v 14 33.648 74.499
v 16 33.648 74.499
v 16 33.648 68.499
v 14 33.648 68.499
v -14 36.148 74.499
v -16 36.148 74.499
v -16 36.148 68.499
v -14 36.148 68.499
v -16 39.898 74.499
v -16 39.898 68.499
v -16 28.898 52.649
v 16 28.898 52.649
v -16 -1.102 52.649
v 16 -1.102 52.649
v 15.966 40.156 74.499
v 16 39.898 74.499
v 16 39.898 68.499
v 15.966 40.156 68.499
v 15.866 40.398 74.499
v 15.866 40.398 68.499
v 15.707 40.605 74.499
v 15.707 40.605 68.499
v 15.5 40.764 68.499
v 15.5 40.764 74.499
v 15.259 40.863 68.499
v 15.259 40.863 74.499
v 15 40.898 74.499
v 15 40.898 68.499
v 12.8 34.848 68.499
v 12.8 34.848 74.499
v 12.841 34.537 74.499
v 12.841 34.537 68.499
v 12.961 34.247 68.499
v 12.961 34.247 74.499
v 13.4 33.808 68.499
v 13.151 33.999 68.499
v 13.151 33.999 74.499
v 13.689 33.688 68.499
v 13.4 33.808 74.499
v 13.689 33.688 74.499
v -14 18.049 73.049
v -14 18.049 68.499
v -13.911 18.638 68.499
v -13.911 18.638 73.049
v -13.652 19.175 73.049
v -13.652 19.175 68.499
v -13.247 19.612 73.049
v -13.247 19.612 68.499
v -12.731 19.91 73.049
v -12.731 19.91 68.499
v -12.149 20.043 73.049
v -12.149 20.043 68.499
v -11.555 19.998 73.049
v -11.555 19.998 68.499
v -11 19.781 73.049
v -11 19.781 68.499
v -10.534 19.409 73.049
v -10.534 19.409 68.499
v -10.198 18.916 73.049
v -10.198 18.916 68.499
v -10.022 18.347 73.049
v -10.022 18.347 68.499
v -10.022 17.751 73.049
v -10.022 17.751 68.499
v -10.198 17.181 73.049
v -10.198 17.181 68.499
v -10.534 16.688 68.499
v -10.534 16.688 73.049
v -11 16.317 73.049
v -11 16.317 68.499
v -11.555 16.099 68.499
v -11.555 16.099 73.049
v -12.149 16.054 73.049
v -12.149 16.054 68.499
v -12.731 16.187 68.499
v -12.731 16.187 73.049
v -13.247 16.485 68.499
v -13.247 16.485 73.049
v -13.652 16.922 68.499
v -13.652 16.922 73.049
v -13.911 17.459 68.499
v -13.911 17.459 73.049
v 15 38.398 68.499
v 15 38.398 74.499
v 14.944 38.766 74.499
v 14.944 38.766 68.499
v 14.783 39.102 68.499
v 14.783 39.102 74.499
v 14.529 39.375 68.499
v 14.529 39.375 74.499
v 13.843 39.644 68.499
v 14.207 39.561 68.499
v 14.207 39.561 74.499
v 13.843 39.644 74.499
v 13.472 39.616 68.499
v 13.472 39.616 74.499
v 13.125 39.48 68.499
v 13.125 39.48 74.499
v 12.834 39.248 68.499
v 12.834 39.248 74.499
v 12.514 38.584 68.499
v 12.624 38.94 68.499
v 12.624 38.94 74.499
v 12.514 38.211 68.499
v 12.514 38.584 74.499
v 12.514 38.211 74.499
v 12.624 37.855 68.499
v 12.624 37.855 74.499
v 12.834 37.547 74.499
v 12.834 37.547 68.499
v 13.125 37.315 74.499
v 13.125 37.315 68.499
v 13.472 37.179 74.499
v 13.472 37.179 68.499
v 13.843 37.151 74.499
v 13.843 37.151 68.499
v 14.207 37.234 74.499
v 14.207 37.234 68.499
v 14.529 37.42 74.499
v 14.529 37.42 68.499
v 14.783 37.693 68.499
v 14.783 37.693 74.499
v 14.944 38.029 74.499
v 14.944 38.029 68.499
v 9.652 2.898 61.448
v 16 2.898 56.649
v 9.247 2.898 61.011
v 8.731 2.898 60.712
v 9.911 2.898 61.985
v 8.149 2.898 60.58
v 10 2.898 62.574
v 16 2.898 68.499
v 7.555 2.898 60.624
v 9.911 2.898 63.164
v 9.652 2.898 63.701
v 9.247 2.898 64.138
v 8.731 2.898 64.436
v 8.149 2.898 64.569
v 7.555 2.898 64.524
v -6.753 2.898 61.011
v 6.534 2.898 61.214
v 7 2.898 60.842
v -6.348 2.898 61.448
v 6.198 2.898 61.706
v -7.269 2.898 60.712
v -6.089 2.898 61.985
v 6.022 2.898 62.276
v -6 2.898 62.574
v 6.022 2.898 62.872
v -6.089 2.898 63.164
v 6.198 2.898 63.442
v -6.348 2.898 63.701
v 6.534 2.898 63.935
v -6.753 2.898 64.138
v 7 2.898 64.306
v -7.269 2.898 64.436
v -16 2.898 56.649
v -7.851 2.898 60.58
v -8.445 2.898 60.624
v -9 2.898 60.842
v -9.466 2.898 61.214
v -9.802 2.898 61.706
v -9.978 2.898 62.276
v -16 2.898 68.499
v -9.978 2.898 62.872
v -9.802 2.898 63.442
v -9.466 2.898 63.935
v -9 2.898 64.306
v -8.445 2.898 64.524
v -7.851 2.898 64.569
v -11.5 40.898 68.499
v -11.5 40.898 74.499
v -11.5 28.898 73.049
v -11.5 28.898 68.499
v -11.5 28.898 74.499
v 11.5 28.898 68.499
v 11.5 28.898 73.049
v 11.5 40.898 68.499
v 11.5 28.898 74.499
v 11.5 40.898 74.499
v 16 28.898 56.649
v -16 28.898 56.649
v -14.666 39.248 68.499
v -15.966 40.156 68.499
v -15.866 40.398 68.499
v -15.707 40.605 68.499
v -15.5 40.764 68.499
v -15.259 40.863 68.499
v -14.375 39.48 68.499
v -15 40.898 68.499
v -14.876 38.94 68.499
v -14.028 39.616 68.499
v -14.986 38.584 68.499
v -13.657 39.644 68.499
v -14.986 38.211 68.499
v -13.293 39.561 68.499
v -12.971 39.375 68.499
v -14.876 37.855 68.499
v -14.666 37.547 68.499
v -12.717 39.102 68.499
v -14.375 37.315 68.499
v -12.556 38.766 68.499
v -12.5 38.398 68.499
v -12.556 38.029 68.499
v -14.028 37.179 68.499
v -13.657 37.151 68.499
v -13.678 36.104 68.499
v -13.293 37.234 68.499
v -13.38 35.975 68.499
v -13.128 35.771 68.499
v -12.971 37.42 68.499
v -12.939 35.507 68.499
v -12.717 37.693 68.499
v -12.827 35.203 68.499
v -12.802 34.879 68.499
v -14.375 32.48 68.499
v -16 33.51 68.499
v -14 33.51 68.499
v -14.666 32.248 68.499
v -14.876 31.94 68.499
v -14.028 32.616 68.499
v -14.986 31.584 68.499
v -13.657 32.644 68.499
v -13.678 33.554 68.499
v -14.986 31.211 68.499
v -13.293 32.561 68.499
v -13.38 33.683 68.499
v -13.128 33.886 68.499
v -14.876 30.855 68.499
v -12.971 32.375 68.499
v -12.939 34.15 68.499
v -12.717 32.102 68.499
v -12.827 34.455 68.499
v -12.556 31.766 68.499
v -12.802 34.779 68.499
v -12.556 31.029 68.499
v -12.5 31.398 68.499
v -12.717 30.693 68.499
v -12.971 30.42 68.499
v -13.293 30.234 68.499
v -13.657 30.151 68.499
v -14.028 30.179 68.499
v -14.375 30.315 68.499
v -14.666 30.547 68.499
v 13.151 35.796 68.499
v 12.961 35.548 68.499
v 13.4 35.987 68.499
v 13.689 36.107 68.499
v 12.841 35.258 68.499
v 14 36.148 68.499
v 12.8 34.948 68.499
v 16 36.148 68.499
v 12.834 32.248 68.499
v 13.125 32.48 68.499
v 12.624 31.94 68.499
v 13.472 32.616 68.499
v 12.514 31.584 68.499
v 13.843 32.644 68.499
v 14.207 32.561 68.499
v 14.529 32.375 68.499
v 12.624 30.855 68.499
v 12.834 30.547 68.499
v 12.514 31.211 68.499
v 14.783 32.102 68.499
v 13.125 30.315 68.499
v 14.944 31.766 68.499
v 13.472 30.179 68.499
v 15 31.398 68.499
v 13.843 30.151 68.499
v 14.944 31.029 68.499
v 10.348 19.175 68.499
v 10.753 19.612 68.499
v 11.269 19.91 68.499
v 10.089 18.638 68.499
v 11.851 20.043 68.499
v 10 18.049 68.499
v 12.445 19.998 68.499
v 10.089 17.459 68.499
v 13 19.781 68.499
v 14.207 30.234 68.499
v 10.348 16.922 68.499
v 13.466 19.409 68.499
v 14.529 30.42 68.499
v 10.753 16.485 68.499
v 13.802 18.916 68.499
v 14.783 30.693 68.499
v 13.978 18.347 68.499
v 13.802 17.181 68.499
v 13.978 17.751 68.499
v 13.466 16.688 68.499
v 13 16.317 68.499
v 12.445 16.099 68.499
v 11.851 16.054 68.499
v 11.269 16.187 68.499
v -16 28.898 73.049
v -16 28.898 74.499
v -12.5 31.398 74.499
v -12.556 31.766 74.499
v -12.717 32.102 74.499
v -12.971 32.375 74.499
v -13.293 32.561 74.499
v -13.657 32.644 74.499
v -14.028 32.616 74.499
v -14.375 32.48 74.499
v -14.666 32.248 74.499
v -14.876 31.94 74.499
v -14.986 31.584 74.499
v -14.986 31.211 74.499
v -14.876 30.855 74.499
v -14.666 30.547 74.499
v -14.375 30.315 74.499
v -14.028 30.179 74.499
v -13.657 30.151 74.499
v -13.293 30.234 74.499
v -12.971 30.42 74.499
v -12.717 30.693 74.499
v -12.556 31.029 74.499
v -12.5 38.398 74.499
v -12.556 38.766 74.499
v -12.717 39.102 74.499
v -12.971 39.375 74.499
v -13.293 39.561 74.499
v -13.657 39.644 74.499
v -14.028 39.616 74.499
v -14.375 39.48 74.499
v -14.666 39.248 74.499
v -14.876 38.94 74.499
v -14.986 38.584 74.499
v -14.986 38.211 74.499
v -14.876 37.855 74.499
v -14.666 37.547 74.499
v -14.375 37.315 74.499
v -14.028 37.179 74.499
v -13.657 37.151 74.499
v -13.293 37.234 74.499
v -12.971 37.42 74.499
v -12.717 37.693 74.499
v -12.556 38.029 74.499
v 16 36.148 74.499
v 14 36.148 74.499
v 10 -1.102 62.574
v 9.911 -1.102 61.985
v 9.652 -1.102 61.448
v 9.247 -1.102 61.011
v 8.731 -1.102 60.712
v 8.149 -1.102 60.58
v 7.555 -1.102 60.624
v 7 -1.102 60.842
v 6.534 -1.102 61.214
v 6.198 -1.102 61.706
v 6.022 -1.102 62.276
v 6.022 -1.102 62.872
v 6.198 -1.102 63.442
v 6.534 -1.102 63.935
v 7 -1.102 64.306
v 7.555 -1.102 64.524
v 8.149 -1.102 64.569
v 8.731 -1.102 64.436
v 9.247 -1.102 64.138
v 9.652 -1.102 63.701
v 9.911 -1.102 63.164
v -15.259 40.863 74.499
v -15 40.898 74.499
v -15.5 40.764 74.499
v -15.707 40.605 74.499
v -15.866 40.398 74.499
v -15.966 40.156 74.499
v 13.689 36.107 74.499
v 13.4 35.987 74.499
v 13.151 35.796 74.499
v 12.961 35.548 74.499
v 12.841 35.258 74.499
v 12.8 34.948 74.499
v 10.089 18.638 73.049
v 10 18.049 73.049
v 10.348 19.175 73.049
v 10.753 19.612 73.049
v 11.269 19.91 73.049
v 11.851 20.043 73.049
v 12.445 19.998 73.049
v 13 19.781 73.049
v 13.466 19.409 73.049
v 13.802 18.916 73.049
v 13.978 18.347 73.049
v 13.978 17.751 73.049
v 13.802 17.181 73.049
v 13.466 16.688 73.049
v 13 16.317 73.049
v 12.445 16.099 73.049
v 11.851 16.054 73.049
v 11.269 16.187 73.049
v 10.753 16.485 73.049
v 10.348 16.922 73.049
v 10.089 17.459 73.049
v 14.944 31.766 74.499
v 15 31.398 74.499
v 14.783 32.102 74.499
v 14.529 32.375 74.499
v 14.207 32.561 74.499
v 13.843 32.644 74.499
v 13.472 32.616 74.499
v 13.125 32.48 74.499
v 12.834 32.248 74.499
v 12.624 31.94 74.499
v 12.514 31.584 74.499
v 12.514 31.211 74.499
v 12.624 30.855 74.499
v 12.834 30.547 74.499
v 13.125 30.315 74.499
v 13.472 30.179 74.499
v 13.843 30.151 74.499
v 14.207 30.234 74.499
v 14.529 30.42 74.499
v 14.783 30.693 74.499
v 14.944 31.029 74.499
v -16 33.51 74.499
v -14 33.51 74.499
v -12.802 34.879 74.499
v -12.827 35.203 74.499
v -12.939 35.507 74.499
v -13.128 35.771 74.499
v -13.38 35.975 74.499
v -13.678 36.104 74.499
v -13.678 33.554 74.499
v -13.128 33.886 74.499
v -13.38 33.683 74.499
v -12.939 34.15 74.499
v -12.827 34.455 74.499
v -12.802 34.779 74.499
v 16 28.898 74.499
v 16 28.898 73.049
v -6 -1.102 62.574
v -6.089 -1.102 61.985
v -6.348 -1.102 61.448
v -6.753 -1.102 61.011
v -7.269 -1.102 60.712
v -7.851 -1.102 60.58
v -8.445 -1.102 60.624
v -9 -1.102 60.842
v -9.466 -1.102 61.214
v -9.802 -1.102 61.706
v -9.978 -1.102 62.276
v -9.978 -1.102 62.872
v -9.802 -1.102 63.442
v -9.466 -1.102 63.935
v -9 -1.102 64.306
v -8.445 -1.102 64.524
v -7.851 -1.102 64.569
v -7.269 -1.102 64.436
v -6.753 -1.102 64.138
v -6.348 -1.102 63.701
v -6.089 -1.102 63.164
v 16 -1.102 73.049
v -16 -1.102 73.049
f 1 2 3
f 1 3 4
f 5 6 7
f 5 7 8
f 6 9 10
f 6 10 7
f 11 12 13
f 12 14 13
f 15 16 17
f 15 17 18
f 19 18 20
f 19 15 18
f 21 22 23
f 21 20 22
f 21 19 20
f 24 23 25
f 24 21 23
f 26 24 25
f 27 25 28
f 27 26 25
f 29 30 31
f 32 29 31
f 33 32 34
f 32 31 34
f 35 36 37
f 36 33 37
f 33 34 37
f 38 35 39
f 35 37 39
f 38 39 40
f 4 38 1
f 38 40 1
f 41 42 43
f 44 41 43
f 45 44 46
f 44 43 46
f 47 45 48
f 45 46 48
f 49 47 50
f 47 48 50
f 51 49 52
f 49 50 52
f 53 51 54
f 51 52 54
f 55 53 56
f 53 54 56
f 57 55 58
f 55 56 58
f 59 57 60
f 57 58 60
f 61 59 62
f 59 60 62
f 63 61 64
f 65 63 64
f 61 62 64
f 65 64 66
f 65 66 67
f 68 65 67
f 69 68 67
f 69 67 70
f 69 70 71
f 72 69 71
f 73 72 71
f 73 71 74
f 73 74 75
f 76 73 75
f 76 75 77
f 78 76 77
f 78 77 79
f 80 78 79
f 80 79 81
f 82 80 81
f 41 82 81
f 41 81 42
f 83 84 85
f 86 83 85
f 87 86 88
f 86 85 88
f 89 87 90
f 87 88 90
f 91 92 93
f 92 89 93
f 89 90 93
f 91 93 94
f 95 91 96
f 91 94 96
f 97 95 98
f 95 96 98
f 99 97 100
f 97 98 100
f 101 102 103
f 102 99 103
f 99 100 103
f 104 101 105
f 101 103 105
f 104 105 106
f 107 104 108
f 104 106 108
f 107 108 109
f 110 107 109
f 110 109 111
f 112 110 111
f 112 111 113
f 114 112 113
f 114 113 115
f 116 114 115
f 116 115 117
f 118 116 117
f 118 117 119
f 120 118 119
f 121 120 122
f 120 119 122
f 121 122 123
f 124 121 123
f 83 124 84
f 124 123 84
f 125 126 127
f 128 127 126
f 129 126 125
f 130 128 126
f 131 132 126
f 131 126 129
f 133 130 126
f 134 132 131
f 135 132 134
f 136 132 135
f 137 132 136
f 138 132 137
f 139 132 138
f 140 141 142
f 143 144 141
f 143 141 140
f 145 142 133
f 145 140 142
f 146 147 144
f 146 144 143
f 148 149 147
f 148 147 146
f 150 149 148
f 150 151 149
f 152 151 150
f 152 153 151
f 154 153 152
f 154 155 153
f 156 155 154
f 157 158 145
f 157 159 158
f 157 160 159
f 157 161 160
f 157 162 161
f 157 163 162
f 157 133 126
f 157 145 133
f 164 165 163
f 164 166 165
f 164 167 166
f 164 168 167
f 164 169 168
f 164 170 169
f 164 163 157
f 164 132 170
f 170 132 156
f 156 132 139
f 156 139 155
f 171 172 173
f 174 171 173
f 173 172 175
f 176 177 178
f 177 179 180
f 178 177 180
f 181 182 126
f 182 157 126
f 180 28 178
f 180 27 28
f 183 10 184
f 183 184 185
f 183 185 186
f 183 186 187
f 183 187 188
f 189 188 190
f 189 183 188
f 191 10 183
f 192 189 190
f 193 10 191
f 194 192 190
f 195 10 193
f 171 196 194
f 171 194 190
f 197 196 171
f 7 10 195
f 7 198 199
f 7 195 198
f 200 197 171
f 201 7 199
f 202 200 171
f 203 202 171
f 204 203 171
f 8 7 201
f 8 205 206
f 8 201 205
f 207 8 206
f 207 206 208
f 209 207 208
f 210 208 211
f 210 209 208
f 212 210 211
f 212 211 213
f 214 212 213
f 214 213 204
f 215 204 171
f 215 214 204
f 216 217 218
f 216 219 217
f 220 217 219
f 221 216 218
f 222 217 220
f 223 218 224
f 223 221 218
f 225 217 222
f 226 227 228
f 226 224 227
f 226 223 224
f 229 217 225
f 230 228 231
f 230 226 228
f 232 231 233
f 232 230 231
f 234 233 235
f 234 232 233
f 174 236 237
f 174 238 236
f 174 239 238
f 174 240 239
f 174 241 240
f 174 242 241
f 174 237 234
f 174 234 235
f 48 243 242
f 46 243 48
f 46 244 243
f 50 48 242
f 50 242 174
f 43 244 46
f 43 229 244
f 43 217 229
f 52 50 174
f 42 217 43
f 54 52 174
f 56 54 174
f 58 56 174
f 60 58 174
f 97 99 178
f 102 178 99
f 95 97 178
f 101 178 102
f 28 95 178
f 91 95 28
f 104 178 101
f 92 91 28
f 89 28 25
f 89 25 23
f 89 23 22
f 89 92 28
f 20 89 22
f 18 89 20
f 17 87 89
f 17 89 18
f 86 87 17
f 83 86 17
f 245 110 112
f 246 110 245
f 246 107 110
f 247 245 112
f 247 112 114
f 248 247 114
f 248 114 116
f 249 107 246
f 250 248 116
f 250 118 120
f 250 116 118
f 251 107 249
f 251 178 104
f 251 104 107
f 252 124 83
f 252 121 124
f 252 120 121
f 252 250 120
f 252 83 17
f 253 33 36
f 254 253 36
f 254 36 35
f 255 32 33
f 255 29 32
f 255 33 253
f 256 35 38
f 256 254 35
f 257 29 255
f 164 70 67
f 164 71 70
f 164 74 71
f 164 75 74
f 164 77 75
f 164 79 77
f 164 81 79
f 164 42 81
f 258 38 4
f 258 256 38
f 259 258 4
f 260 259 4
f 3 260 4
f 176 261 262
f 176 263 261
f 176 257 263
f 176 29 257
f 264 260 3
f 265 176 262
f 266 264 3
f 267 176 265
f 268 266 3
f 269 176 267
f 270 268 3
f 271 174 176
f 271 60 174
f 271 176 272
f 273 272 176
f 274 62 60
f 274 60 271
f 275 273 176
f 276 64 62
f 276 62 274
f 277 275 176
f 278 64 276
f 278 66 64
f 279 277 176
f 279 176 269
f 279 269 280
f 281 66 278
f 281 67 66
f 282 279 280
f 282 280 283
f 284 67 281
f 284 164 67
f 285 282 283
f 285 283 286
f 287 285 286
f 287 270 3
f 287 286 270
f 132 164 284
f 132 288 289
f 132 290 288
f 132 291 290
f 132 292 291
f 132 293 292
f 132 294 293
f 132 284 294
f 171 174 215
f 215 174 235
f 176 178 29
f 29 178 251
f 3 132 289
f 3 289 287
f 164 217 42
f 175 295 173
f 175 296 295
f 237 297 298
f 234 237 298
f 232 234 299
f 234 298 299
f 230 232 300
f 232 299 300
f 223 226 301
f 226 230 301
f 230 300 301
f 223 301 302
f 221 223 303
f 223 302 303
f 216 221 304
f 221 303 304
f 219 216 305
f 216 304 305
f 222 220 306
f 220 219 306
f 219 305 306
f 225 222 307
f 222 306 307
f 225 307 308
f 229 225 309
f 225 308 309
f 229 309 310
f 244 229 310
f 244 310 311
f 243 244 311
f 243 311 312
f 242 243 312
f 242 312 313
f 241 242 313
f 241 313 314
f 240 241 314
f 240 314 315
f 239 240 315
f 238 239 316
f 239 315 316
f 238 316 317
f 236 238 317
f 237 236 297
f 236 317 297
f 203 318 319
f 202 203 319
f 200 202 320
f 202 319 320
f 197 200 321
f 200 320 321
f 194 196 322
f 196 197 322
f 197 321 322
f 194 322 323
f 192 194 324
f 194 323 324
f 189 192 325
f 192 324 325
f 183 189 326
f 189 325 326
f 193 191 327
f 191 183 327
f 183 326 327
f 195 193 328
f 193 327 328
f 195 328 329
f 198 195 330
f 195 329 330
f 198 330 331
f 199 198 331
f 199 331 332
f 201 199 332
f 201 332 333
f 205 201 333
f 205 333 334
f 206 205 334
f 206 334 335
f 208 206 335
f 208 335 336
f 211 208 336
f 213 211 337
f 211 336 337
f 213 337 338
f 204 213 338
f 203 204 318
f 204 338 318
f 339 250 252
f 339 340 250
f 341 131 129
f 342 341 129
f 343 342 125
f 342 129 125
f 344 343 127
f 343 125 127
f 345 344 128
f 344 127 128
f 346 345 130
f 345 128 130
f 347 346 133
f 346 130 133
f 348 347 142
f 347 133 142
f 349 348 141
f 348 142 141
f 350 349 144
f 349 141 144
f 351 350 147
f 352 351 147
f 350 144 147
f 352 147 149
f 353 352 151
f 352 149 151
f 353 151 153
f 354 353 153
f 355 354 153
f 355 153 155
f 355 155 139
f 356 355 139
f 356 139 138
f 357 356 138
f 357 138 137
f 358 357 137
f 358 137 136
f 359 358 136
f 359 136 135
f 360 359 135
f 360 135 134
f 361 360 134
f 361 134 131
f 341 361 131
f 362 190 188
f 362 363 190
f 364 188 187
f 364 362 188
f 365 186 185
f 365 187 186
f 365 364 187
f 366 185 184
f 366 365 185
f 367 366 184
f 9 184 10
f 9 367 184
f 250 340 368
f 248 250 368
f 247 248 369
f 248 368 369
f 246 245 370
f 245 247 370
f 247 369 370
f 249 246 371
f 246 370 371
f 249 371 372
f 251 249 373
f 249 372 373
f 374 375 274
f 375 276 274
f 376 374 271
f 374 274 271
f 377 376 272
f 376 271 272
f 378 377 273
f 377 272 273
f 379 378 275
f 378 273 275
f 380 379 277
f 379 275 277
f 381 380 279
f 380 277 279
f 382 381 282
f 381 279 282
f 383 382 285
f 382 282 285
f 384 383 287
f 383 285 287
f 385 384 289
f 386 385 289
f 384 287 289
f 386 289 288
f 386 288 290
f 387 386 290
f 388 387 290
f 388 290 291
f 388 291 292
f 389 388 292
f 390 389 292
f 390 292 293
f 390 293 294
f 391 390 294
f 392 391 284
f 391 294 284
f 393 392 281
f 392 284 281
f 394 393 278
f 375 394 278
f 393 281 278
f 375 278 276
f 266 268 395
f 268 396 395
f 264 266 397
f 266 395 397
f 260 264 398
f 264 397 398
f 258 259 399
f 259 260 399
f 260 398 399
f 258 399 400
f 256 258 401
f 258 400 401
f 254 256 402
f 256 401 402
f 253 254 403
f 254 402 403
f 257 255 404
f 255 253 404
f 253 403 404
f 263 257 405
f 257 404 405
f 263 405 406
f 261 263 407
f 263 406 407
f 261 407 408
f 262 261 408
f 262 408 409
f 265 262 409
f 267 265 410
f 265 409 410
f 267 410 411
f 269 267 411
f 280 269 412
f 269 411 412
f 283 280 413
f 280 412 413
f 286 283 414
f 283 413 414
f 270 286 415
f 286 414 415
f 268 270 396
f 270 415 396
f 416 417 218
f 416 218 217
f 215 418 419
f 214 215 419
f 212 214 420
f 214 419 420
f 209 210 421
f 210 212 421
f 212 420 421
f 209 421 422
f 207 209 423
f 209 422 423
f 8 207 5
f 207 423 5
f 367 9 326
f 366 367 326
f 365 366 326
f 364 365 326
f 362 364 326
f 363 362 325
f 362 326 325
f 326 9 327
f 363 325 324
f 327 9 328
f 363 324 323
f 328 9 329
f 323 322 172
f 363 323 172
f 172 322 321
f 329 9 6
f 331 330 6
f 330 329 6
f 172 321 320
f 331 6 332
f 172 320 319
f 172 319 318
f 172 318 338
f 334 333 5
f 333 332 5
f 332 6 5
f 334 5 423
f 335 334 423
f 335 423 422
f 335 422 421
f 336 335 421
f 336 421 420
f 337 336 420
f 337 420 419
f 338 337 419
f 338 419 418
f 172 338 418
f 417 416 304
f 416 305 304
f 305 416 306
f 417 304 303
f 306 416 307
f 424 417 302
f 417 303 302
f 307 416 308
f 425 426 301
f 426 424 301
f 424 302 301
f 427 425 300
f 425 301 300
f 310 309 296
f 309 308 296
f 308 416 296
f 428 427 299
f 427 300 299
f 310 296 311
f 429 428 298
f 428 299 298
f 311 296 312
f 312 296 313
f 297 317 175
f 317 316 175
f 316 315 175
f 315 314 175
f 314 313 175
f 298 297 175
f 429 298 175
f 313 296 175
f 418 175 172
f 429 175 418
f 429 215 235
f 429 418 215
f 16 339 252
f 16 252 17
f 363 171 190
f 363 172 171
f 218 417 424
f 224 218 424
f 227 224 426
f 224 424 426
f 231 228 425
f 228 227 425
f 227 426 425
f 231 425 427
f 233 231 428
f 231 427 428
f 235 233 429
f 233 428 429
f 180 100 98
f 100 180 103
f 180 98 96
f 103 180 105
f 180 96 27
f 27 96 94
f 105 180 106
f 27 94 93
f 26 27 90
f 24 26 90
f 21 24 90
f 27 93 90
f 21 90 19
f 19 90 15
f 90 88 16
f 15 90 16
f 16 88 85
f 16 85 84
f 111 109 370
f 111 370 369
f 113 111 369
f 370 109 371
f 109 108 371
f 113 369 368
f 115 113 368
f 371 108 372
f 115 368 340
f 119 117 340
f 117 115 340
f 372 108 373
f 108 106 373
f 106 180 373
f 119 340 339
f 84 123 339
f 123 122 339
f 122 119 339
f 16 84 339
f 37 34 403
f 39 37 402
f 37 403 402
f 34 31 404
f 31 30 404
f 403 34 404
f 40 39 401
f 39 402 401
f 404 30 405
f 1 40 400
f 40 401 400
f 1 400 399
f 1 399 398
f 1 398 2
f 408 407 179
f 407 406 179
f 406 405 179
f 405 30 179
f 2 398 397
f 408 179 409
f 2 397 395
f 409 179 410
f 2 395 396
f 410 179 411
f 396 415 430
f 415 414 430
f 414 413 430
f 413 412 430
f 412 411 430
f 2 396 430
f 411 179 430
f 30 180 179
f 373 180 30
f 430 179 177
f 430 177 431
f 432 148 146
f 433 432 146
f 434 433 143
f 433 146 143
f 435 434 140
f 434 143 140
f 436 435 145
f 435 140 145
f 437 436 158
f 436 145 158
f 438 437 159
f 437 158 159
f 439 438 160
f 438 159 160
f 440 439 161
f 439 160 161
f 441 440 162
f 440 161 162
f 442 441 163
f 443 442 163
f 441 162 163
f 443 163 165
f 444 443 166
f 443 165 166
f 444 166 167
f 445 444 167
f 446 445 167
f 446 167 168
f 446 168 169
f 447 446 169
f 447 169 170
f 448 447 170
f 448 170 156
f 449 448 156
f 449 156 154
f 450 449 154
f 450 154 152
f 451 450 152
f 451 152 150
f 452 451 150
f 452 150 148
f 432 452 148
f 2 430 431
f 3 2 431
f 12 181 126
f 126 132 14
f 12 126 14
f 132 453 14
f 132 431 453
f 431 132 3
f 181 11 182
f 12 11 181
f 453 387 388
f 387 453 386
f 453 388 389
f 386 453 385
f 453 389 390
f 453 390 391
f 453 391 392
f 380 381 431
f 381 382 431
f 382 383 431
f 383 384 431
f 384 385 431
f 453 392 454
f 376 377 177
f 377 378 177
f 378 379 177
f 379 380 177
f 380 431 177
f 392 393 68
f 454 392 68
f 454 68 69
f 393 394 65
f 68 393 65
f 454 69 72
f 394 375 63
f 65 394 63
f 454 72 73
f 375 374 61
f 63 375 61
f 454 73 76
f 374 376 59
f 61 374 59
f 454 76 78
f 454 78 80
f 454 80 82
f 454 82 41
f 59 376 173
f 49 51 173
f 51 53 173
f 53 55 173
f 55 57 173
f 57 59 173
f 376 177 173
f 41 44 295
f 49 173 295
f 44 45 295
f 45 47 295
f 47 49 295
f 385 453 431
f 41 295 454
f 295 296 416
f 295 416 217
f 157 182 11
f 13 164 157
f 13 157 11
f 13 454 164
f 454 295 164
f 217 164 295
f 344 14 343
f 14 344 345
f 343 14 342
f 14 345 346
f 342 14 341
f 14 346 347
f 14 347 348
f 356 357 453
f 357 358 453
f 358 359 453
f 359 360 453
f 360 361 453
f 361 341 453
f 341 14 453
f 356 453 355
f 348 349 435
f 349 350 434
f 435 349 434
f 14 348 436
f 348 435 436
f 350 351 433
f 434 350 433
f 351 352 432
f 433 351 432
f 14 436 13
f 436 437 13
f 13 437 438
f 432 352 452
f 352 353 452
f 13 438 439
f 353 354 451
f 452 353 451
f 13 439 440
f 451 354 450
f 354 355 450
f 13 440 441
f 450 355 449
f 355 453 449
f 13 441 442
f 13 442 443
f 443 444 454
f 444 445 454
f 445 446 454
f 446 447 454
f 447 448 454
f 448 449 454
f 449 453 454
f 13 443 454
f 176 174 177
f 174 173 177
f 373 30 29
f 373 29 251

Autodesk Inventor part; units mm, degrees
ref_plane "РабПлоскость1" through (0, 34.8975, 74.4992) normal (0, 0, -1) x (1, 0, 0)
sketch "Эскиз1" plane through (0, 34.8975, 74.4992) normal (0, 0, -1) x (1, 0, 0)
  line L0 (11.5, 6) -> (11.5, -6) projected
  line L1 (15, -6) -> (11.5, -6) projected
  arc A0 (15, -6) -> (16, -5) centre (15, -5) ccw projected
  line L2 (16, -1.25) -> (16, -5) projected
  line L3 (14, -1.25) -> (16, -1.25) projected
  arc A1 (12.8, -0.05) -> (14, -1.25) centre (14, -0.05) ccw projected
  line L4 (12.8, 0.05) -> (12.8, -0.05) projected
  arc A2 (14, 1.25) -> (12.8, 0.05) centre (14, 0.05) ccw projected
  line L5 (16, 1.25) -> (14, 1.25) projected
  line L6 (16, 5) -> (16, 1.25) projected
  arc A3 (16, 5) -> (15, 6) centre (15, 5) ccw projected
  line L7 (11.5, 6) -> (15, 6) projected
  circle A4 centre (13.75, 3.5) radius 1.25 projected
  circle A5 centre (13.75, -3.5) radius 1.25 projected
  line L8 (-11.5, -6) -> (-11.5, 6) projected
  line L9 (-15, 6) -> (-11.5, 6) projected
  arc A6 (-15, 6) -> (-16, 5) centre (-15, 5) ccw projected
  line L10 (-16, 1.3872) -> (-16, 5) projected
  line L11 (-14, 1.3872) -> (-16, 1.3872) projected
  arc A7 (-12.802, 0.1186) -> (-14, 1.3872) centre (-14, 0.1872) ccw projected
  line L12 (-12.802, 0.0186) -> (-12.802, 0.1186) projected
  arc A8 (-14, -1.25) -> (-12.802, 0.0186) centre (-14, -0.05) ccw projected
  line L13 (-16, -1.25) -> (-14, -1.25) projected
  line L14 (-16, -5) -> (-16, -1.25) projected
  arc A9 (-16, -5) -> (-15, -6) centre (-15, -5) ccw projected
  line L15 (-11.5, -6) -> (-15, -6) projected
  circle A10 centre (-13.75, 3.5) radius 1.25 projected
  circle A11 centre (-13.75, -3.5) radius 1.25 projected
  line L16 (16, 5) -> (16, 6)
  line L17 (16, 6) -> (15, 6)
  line L18 (-16, 5) -> (-16, 6)
  line L19 (-16, 6) -> (-15, 6)
  point P0 (0, 34.8975)
extrude "Выдавливание1" add sketch "Эскиз1" along normal blind 6
sketch "Эскиз2" plane through (0, 34.8975, 68.4992) normal (0, 0, -1) x (-1, 0, 0)
  point P0 (0, -34.8975)
sketch "Эскиз3" plane through (11.5, 28.8975, 74.4992) normal (0, -1, 0) x (1, 0, 0)
  line L0 (4.5, 0) -> (4.5, -6) projected
  line L1 (4.5, -6) -> (0, -6)
  line L2 (0, -6) -> (0, 0)
  line L3 (0, 0) -> (4.5, 0)
  line L4 (4.5, 0) -> (4.5, -6)
  line L5 (-27.5, 0) -> (-27.5, -6) projected
  line L6 (-23, 0) -> (-23, -6) projected
  line L7 (-27.5, -6) -> (-23, -6)
  line L8 (-23, -6) -> (-23, 0)
  line L9 (-23, 0) -> (-27.5, 0)
  line L10 (-27.5, 0) -> (-27.5, -6)
  line L11 (0, -6) -> (-23, -6)
  line L12 (-23, -6) -> (-23, 0)
  line L13 (-23, 0) -> (0, 0)
  line L14 (0, 0) -> (0, -6)
  line L15 (18.5784, -1.45) -> (-41.4216, -1.45) projected
  point P0 (-11.5, -74.4992)
  point P1 (4.5, -1.45)
  point P2 (-27.5, -1.45)
extrude "Выдавливание2" add sketch "Эскиз3" along normal blind 30 contours L0 L1 L2 L15 | L2 L11 L6 L15 | L6 L7 L5 L15
sketch "Эскиз4" plane through (0, 34.8975, 68.4992) normal (0, 0, -1) x (-1, 0, 0)
  line L0 (-16, -6) -> (-11.5, -6) projected
  line L1 (16, -6) -> (16, -36) projected
  line L2 (-16, -6) -> (16, -6)
  line L3 (16, -6) -> (16, -16)
  line L4 (16, -16) -> (-16, -16)
  line L5 (-16, -16) -> (-16, -6)
  point P0 (16, -6)
  point P1 (-11.5, -6)
  dimension "d4" = 10
ref_plane "РабПлоскость2" through (-11.5, 28.8975, 52.6492) normal (0, 0, -1) x (0, 1, 0)
sketch "Эскиз5" plane through (0, 34.8975, 68.4992) normal (0, 0, -1) x (-1, 0, 0)
  line L0 (-16, -36) -> (16, -36) projected
  line L1 (16, -36) -> (-16, -36)
  line L2 (-16, -36) -> (-16, -32)
  line L3 (-16, -32) -> (16, -32)
  line L4 (16, -32) -> (16, -36)
  point P0 (0, -34.8975)
  point P1 (-16, -36)
  dimension "d7" = 4
ref_plane "РабПлоскость3" through (-11.5, 28.8975, 52.6492) normal (0, 0, -1) x (0, 1, 0)
extrude "Выдавливание4" add sketch "Эскиз5" along normal up to surface (15.85 mm away)
sketch "Эскиз6" plane through (-16, 2.8975, 68.4992) normal (0, 1, 0) x (1, 0, 0)
  line L0 (32, -4.55) -> (32, 15.85) projected
  line L1 (0, -4.55) -> (0, 15.85) projected
  line L2 (32, 15.85) -> (0, 15.85)
  line L3 (0, 15.85) -> (0, 11.85)
  line L4 (0, 11.85) -> (32, 11.85)
  line L5 (32, 11.85) -> (32, 15.85)
  point P0 (16, 68.4992)
  point P1 (32, 11.85)
  dimension "d10" = 4
ref_plane "РабПлоскость4" through (-15, 28.8975, 52.6492) normal (0, -1, 0) x (1, 0, 0)
extrude "Выдавливание5" add sketch "Эскиз6" along normal up to surface (26 mm away)
sketch "Эскиз7" plane through (-16, 2.8975, 68.4992) normal (0, 1, 0) x (1, 0, 0)
  line L0 (32, 11.85) -> (0, 11.85) projected
  line L1 (0, 0) -> (0, 11.85) projected
  line L2 (32, 0) -> (0, 0) projected
  line L3 (32, 0) -> (32, 11.85) projected
  point P0 (16, 68.4992)
sketch "Эскиз8" plane through (-16, 2.8975, 68.4992) normal (0, 1, 0) x (1, 0, 0)
  circle A0 centre (8, 5.925) radius 2
  circle A1 centre (24, 5.925) radius 2
  line L0 (27.5, 0) -> (31, 0) projected
  line L1 (4.5, 0) -> (27.5, 0) projected
  line L2 (0, 0) -> (0, 11.85) projected
  line L3 (32, 0) -> (32, 11.85) projected
  point P0 (16, 68.4992)
  dimension "d13" = 4
  dimension "d14" = 4
  dimension "d15" = 5.925
  dimension "d16" = 5.925
  dimension "d17" = 8
  dimension "d18" = 8
extrude "Выдавливание6" cut sketch "Эскиз8" against normal blind 10
sketch "Эскиз9" plane through (0, 34.8975, 68.4992) normal (0, 0, -1) x (-1, 0, 0)
  circle A0 centre (-12, -16.8489) radius 2
  circle A1 centre (12, -16.8489) radius 2
  line L0 (-16, -36) -> (-16, -6) projected
  line L1 (-16, -6) -> (16, -6) projected
  line L2 (16, -1.3872) -> (16, -32) projected
  point P0 (0, -34.8975)
  dimension "d21" = 4
  dimension "d22" = 4
  dimension "d24" = 4
  dimension "d25" = 24
extrude "Выдавливание7" cut sketch "Эскиз9" against normal blind 10
properties part number "держатель сервомоторчика"
